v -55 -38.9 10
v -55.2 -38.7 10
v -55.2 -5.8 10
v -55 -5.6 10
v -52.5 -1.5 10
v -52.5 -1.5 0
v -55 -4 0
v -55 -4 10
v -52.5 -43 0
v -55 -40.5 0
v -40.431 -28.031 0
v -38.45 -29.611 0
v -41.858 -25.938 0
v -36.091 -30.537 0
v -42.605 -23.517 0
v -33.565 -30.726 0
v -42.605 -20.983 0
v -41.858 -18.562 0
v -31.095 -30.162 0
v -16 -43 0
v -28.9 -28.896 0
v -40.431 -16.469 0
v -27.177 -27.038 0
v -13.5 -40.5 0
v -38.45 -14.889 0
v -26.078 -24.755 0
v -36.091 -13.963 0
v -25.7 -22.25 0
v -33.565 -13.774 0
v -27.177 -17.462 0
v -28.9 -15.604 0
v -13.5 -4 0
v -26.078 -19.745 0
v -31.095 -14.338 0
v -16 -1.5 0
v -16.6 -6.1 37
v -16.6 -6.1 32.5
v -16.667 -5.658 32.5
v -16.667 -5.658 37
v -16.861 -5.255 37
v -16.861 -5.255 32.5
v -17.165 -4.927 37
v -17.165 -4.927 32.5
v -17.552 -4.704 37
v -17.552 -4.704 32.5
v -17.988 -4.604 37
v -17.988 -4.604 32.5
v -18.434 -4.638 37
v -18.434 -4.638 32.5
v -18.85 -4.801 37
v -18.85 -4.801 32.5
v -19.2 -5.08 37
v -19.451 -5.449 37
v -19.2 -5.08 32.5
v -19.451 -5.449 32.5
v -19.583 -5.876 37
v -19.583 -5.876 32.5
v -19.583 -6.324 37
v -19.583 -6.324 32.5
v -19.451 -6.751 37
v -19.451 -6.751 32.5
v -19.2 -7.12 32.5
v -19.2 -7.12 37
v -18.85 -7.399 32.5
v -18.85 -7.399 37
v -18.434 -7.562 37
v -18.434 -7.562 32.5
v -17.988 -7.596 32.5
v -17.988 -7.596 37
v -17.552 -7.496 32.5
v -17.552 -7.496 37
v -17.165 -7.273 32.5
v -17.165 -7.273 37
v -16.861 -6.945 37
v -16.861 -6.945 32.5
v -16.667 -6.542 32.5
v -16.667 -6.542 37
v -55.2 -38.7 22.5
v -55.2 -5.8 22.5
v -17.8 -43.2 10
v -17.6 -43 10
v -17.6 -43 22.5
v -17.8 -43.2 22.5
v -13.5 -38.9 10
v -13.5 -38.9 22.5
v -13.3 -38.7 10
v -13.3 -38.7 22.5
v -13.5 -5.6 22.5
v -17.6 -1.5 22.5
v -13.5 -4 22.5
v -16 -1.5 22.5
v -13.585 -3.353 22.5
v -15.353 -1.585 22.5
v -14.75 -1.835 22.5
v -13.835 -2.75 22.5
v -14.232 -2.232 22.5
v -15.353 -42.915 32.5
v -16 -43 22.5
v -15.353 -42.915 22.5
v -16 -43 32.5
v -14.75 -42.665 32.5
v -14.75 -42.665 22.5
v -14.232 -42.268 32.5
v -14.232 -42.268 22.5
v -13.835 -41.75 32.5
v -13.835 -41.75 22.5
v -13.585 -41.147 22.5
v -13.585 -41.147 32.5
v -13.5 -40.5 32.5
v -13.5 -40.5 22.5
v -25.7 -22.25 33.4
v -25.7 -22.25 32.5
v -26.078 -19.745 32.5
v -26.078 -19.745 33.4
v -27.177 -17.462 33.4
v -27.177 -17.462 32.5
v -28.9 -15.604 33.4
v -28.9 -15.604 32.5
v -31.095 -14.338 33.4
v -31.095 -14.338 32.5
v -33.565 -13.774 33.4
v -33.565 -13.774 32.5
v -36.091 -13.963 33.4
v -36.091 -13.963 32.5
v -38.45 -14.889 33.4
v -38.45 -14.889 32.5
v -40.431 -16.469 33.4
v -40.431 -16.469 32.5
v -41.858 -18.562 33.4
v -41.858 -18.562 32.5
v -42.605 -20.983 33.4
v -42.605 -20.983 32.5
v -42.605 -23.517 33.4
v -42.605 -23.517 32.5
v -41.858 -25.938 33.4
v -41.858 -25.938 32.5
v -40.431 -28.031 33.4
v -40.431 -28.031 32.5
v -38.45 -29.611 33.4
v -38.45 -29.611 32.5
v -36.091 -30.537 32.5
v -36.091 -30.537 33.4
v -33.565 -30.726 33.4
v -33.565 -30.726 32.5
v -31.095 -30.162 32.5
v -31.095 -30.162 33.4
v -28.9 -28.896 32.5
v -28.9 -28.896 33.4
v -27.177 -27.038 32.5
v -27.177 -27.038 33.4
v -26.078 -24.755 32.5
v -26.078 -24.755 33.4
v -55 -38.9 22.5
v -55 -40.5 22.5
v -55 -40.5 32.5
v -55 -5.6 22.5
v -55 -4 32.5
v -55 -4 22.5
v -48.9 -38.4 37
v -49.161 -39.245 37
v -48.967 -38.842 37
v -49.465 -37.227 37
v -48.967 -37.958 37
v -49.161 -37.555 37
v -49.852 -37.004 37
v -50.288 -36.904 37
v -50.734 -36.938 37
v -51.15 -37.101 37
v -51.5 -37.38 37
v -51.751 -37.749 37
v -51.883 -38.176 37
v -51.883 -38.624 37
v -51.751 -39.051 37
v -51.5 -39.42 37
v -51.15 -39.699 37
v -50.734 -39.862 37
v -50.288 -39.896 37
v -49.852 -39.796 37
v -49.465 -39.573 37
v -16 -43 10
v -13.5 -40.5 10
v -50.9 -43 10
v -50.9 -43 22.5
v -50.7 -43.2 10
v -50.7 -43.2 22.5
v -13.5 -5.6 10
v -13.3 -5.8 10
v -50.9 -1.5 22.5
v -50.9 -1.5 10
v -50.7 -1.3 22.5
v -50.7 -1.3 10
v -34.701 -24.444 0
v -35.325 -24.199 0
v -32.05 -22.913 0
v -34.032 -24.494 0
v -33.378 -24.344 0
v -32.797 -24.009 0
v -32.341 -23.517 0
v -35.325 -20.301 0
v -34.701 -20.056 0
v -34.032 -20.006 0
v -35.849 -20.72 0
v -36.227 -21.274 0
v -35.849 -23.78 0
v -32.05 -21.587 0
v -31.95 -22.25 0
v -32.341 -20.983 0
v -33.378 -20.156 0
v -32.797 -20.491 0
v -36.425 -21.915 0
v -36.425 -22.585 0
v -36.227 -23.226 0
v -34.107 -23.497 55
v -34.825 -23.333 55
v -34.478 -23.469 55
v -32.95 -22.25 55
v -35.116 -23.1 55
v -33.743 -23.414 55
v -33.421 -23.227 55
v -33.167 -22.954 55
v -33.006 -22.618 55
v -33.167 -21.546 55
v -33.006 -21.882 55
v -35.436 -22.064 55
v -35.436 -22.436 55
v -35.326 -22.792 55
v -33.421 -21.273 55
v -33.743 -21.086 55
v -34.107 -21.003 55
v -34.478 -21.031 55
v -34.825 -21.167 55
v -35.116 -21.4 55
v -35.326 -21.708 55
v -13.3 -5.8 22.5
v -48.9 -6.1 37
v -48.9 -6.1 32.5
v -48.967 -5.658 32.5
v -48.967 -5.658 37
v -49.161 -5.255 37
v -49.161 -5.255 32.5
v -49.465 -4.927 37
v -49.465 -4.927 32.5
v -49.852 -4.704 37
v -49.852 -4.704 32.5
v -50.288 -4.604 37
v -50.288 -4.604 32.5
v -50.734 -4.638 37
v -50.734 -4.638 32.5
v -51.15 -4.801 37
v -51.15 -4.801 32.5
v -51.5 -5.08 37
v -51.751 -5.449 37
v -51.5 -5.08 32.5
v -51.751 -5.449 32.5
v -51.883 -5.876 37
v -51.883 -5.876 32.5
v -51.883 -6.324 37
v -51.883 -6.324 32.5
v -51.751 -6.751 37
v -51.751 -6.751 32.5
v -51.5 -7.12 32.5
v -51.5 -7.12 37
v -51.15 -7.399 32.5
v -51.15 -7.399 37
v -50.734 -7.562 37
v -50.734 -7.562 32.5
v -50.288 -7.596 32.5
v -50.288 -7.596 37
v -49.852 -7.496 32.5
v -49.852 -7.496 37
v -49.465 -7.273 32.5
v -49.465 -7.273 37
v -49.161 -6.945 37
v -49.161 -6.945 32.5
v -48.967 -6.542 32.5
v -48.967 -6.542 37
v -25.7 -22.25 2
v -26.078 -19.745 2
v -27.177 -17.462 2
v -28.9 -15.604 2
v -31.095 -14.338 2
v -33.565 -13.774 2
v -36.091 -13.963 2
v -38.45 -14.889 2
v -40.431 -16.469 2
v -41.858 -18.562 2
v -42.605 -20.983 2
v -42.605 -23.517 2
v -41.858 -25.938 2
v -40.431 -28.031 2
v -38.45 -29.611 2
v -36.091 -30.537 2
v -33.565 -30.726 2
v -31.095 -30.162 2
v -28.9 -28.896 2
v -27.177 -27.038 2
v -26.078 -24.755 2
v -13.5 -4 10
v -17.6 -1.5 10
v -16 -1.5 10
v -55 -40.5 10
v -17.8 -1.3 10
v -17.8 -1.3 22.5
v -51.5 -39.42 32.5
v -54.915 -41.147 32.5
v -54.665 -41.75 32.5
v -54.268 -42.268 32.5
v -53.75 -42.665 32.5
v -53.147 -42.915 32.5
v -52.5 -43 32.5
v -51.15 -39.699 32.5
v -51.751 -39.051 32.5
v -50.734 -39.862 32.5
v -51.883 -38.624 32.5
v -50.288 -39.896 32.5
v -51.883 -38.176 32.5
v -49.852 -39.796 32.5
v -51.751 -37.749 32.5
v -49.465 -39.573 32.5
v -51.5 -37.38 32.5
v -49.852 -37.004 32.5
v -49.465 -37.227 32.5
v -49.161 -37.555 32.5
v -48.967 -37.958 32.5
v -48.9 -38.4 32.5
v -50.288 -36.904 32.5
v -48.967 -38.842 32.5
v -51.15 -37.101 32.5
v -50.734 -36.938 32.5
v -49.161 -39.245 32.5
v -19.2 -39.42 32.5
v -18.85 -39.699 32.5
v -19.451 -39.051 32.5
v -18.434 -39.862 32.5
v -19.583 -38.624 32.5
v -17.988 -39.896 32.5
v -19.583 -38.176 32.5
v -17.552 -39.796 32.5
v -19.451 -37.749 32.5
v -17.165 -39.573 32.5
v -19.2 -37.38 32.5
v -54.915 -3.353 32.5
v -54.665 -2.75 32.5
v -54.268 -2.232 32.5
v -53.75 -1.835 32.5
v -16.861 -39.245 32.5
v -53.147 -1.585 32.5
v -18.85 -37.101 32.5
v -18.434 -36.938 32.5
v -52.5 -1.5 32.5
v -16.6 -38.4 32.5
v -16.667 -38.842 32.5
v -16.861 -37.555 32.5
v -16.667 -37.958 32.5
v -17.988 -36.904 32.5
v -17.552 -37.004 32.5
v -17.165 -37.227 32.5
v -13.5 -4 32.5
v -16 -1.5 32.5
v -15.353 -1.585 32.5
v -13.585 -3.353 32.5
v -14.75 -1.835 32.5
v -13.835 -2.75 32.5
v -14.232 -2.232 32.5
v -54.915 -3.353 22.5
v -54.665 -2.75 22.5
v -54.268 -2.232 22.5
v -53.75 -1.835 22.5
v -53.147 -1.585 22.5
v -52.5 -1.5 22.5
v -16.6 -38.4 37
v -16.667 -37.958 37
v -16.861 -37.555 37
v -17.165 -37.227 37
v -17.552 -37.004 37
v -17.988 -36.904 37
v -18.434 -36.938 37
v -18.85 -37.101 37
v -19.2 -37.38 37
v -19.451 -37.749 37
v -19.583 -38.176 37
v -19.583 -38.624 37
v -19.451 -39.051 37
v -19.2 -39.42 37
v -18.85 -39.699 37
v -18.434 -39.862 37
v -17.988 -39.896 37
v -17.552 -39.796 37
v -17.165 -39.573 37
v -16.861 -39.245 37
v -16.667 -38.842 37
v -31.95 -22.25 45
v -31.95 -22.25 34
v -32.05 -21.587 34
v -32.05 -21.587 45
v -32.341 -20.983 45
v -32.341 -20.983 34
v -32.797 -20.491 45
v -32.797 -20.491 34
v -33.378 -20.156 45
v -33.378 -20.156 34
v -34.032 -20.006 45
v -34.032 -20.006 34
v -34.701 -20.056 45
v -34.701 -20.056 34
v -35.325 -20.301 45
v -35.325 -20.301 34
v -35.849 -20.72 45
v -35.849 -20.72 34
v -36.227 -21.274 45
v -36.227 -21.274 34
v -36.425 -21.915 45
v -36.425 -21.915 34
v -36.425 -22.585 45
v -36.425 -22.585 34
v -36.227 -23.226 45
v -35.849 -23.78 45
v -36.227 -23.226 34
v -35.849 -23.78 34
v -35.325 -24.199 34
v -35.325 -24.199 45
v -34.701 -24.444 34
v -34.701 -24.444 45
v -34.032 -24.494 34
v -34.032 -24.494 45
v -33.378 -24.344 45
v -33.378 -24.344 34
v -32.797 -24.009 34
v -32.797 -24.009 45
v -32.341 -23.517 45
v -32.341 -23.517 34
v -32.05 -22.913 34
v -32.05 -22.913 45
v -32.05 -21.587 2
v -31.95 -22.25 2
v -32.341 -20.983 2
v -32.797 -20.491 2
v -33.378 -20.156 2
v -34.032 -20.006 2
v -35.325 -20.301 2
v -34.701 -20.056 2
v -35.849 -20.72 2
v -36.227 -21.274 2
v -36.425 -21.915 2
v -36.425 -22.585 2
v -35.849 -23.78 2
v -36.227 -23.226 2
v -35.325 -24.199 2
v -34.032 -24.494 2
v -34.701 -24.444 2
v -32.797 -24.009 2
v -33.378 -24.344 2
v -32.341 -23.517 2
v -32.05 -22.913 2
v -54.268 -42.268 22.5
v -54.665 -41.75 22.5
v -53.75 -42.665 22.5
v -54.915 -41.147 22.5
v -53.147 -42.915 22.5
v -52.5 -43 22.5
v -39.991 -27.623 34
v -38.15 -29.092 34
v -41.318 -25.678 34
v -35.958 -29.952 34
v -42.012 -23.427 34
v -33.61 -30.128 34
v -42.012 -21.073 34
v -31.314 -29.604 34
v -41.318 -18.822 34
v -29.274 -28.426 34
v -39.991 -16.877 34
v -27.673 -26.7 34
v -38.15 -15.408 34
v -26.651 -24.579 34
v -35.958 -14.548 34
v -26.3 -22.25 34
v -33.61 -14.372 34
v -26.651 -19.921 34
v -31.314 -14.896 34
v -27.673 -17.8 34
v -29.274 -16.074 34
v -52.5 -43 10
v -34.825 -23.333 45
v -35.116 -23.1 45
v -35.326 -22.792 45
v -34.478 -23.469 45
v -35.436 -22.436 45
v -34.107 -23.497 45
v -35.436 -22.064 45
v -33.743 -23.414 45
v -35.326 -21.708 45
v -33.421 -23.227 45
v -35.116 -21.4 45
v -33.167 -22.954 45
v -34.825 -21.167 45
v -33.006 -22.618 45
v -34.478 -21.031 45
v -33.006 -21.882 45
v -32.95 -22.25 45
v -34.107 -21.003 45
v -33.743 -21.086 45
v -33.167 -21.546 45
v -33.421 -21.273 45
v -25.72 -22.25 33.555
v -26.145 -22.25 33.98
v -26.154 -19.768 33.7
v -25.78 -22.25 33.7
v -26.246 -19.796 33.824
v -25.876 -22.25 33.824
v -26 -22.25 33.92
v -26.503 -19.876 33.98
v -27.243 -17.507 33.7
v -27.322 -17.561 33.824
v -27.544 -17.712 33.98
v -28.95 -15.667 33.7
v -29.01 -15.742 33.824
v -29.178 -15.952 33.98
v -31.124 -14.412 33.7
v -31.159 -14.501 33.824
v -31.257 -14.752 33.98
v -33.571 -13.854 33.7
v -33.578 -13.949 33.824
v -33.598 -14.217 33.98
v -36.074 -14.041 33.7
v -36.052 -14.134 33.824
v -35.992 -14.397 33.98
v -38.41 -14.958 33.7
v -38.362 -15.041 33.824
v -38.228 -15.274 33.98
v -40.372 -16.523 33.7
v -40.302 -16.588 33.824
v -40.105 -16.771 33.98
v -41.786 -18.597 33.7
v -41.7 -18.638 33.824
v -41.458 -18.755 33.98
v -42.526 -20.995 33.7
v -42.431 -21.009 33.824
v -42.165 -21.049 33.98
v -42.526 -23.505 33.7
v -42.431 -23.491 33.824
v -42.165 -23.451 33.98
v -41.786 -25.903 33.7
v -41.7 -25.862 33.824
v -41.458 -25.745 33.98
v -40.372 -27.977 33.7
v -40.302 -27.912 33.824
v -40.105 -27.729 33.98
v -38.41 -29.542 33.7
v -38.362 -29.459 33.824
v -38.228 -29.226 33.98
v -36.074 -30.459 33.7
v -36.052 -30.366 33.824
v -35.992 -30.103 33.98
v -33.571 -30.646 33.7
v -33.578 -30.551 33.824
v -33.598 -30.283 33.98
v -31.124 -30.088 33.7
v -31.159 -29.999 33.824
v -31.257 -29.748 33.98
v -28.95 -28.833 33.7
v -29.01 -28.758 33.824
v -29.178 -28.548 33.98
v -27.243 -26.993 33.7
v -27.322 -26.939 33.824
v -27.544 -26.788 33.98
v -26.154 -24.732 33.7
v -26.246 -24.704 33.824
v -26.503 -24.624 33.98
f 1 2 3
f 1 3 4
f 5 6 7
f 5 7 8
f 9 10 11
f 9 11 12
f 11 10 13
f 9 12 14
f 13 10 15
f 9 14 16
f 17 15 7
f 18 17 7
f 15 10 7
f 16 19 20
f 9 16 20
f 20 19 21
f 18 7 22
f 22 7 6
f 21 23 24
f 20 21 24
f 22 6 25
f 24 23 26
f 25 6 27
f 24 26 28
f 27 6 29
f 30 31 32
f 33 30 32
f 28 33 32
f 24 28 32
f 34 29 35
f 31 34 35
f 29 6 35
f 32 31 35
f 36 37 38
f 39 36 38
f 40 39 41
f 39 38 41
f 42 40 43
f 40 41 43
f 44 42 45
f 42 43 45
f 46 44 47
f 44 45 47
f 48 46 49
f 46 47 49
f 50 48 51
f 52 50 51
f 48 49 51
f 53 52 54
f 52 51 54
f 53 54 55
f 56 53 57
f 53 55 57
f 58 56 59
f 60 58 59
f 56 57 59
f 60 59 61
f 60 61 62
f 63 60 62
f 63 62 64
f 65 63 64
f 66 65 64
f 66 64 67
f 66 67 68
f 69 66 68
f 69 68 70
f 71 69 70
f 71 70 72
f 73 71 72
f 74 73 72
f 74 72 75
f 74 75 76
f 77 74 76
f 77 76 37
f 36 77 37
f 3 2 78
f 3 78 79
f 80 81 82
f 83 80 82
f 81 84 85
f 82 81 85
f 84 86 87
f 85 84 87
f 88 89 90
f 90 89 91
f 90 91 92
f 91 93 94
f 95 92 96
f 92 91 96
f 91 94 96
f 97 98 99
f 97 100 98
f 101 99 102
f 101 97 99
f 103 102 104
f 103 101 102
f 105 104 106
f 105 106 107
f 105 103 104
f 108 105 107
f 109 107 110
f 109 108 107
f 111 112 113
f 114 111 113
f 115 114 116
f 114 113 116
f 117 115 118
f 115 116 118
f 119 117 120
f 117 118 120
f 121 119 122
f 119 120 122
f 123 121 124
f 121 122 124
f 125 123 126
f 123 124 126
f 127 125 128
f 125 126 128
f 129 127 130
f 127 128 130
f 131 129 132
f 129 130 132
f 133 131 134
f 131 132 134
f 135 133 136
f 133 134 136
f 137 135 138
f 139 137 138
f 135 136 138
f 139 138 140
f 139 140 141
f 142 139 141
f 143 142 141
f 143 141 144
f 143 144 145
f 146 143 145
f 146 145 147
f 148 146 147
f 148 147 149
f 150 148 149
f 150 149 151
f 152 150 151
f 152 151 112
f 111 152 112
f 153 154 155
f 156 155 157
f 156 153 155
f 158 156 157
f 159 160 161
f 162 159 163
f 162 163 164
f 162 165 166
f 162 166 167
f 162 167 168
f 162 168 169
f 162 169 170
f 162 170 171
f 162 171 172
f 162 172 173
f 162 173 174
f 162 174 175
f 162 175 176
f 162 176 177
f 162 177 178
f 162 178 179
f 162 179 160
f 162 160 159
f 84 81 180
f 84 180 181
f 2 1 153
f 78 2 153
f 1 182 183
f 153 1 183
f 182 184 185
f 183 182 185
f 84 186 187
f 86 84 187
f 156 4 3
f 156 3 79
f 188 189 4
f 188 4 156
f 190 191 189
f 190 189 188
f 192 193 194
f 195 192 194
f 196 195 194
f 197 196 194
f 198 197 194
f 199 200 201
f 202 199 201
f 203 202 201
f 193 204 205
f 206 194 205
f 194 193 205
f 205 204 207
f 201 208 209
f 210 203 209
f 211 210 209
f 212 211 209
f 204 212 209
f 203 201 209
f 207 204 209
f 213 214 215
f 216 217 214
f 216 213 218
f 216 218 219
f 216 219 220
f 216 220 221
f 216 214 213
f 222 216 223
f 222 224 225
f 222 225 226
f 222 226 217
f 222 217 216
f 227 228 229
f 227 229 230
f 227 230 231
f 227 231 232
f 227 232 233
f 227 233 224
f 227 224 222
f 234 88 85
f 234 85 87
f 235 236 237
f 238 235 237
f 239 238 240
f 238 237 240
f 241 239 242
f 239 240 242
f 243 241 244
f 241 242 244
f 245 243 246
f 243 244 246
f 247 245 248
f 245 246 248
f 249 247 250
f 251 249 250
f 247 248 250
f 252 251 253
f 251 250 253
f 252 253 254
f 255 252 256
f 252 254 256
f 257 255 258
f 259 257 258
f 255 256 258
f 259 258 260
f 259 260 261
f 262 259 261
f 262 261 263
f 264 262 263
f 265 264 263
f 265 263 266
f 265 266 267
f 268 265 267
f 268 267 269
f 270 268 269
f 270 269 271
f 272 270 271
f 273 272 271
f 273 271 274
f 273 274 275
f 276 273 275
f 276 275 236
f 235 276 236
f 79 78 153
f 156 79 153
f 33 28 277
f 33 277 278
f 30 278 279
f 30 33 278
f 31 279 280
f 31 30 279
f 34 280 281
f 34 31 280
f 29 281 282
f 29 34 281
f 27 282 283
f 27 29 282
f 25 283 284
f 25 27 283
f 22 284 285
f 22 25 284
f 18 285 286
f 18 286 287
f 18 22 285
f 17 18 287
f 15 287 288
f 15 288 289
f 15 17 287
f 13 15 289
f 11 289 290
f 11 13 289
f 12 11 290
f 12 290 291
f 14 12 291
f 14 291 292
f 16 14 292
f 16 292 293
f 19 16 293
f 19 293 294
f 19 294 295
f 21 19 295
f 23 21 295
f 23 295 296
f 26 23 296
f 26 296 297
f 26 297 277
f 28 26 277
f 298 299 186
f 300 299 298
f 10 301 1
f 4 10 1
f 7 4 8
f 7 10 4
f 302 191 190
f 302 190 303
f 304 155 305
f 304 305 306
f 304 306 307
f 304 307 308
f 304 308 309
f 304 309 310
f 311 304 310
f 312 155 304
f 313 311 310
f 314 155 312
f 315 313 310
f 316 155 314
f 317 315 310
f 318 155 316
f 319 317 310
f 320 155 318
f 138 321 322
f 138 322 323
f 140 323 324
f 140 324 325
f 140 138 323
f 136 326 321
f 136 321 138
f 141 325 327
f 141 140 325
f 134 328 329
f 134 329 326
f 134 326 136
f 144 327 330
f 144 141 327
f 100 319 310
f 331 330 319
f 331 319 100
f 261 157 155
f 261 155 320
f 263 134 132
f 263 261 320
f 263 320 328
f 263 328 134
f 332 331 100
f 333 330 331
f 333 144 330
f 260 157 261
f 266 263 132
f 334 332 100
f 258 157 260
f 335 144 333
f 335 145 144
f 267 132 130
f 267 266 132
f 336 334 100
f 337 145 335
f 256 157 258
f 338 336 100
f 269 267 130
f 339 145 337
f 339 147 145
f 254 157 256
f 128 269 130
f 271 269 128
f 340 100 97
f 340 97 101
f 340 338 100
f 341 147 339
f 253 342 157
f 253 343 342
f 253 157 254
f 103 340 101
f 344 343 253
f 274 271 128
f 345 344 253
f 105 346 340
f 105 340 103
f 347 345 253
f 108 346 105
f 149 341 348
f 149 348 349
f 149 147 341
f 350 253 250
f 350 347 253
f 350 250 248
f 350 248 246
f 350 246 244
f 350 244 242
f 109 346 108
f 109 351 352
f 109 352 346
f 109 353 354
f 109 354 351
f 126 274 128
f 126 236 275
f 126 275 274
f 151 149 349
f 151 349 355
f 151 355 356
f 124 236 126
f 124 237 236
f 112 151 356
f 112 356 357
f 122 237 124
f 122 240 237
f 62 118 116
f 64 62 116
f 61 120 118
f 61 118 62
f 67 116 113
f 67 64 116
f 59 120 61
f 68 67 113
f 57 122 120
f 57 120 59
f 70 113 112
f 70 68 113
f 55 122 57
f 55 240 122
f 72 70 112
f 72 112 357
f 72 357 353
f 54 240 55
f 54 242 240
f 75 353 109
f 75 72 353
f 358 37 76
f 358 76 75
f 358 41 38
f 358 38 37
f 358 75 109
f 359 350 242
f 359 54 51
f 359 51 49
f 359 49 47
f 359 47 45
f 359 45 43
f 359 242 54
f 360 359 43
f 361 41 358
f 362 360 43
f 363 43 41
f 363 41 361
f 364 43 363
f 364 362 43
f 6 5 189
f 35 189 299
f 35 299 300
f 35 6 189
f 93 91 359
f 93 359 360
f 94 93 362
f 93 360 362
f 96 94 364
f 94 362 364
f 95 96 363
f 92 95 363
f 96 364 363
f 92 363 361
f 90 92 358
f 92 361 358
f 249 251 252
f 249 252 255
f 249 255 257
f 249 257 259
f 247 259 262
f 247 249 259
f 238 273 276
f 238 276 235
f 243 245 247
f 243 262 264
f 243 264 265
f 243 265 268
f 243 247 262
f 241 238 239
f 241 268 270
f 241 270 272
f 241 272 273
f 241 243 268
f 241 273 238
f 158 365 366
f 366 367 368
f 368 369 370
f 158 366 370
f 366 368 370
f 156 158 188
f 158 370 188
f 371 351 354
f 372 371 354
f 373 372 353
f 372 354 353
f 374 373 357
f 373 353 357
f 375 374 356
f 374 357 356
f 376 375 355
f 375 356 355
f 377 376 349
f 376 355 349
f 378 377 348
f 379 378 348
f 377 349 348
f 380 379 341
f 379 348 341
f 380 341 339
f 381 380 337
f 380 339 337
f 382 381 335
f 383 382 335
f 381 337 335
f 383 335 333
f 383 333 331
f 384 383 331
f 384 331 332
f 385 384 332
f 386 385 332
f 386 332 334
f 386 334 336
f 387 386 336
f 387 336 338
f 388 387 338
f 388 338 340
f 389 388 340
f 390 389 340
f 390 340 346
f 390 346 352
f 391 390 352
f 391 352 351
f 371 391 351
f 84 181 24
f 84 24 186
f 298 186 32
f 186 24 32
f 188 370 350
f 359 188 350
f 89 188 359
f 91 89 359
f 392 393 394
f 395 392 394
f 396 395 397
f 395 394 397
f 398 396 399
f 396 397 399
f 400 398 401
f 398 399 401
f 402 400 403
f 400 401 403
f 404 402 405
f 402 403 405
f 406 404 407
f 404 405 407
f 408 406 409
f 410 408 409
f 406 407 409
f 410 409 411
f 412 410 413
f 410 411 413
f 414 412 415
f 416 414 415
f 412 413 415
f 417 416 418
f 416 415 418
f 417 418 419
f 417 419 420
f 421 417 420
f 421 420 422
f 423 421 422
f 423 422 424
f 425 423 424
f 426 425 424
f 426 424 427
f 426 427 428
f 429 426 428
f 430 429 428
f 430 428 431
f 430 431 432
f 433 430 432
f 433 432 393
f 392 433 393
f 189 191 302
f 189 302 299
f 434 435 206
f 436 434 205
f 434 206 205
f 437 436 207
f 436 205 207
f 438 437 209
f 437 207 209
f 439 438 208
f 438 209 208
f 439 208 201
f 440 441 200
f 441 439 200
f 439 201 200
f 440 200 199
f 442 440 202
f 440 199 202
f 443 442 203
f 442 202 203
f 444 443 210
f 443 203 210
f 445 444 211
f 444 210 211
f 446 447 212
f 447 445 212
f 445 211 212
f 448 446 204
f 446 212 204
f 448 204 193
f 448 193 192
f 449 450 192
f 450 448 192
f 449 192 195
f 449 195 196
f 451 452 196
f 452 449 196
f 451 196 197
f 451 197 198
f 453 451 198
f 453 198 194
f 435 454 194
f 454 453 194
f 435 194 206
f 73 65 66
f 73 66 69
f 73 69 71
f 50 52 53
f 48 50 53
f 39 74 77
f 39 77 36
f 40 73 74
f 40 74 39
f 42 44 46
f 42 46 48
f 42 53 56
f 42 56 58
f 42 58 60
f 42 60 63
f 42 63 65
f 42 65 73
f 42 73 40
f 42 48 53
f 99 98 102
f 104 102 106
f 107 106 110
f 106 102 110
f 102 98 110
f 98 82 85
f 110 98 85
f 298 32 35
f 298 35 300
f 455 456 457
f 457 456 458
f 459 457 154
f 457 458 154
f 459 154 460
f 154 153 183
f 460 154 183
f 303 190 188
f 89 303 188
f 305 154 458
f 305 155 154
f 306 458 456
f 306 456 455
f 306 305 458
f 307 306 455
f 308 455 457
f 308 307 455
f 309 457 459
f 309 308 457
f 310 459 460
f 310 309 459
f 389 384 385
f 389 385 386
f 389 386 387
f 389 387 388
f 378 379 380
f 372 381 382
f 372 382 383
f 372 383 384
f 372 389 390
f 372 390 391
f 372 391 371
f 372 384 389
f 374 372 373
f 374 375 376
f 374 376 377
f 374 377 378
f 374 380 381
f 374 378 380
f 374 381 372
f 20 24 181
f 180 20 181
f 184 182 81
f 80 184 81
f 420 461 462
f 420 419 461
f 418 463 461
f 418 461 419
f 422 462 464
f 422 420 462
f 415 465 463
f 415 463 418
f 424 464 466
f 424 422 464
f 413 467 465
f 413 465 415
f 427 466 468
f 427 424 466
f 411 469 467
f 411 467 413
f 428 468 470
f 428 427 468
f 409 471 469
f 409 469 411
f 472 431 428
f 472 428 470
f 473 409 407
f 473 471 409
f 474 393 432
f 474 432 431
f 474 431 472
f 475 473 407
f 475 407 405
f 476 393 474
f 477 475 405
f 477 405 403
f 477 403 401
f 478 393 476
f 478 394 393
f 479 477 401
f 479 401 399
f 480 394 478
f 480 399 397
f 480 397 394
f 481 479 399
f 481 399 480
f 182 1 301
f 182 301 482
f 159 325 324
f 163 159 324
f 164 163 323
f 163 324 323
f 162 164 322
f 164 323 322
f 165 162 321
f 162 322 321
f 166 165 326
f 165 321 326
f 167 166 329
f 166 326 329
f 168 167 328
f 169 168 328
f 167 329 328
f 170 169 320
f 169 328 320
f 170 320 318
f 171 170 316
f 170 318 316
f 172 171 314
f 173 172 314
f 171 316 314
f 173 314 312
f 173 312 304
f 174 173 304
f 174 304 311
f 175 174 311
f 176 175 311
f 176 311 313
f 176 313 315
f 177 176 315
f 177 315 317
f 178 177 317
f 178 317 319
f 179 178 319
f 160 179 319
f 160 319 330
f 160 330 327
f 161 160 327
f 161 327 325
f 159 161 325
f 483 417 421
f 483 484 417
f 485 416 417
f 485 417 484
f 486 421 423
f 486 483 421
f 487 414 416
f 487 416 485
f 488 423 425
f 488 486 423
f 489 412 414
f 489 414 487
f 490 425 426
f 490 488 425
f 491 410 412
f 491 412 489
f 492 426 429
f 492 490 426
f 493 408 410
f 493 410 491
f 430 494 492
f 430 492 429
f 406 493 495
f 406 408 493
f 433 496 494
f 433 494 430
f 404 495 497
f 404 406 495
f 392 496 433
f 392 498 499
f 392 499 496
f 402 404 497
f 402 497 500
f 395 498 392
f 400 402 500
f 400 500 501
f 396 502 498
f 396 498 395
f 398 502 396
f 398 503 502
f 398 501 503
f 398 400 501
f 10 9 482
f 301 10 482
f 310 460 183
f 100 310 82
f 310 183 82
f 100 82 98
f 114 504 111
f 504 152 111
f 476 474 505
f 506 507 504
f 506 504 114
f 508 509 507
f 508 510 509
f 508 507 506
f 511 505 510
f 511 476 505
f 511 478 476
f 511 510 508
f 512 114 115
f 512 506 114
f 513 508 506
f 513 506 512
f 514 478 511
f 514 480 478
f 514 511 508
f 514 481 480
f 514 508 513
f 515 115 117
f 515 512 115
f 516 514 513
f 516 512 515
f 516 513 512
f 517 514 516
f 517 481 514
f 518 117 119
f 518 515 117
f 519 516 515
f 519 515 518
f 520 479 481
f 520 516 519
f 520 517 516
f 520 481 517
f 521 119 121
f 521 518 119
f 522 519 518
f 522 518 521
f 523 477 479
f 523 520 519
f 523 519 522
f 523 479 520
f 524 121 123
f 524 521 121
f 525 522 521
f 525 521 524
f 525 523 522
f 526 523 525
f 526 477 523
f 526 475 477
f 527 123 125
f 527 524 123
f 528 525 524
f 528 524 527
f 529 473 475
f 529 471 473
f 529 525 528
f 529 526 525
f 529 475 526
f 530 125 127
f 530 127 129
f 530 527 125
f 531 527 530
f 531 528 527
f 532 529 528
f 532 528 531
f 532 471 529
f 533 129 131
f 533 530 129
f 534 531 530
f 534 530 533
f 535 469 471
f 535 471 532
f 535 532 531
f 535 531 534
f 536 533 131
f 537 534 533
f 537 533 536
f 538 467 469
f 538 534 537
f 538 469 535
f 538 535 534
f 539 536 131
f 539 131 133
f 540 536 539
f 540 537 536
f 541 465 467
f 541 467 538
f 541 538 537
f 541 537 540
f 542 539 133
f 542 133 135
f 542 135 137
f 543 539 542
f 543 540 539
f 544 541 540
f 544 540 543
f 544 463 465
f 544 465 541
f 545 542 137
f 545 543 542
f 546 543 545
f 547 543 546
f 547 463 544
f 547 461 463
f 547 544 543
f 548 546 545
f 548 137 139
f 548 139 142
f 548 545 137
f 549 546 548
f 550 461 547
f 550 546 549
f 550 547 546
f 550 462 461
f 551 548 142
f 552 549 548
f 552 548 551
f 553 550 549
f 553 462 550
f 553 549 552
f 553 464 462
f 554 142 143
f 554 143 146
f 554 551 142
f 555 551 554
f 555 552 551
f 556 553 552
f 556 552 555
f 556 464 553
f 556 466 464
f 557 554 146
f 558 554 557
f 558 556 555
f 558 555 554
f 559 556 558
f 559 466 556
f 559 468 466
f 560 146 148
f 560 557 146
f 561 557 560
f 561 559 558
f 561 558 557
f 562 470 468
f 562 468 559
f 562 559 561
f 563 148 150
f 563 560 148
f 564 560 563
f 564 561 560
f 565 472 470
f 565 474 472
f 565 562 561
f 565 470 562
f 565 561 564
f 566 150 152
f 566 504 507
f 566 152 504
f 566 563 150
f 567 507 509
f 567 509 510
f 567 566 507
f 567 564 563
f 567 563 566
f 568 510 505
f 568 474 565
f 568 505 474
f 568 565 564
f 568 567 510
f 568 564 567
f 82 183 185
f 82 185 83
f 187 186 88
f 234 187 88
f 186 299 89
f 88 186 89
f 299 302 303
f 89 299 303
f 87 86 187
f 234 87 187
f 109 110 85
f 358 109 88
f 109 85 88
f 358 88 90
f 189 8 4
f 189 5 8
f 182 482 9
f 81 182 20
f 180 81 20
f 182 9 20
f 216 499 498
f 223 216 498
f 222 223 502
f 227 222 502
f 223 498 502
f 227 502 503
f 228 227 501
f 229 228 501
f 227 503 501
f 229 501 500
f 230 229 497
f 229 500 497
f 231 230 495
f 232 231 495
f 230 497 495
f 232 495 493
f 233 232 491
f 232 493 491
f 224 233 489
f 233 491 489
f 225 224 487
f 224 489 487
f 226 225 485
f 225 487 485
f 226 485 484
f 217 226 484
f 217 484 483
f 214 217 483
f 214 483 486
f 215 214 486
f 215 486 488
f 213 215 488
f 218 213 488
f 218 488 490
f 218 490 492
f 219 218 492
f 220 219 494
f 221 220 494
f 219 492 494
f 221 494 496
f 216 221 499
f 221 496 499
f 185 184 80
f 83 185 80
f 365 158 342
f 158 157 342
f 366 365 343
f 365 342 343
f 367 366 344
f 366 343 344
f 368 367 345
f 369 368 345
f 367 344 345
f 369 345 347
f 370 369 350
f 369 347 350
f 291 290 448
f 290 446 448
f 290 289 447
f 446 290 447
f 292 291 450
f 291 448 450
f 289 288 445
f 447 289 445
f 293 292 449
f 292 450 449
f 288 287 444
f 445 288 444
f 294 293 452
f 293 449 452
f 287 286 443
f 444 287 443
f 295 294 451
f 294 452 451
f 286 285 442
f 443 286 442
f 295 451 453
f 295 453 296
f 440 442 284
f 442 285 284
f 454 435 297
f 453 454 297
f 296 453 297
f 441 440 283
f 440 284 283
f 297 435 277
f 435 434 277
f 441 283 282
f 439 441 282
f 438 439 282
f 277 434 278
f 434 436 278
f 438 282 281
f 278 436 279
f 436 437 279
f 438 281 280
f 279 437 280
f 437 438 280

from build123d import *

# Parameters (mm, degrees)
CYLINDER007_R     = 1.5
CYLINDER007_DEPTH = 10
CYLINDER006_R     = 1.5
CYLINDER006_DEPTH = 10
CYLINDER005_R     = 1.5
CYLINDER005_DEPTH = 10
CYLINDER004_R     = 1.5
CYLINDER004_DEPTH = 10
CYLINDER001_R     = 8.5
CYLINDER001_DEPTH = 32
FILLET001_R       = 0.6
CYLINDER002_R     = 8.5
CYLINDER002_DEPTH = 3
BOX001_W          = 44.5
BOX001_H          = 44.5
BOX001_DEPTH      = 12.5
BOX_W             = 41.5
BOX_H             = 41.5
BOX_DEPTH         = 32.5
FILLET_R          = 2.5
CHAMFER_SIZE      = 2.5
BOX002_W          = 41.9
BOX002_H          = 41.9
BOX002_DEPTH      = 12.5
CHAMFER001_SIZE   = 4.5
CYLINDER003_R     = 1.25
CYLINDER003_DEPTH = 10
CYLINDER_R        = 2.25
CYLINDER_DEPTH    = 45


with BuildPart() as tornillo020:
    # Cylinder007 → Cylinder007 (new body)
    with BuildSketch(Plane(origin=(-50.4, -6.1, 27), x_dir=(1, 0, 0), z_dir=(0, 0, 1))):
        Circle(CYLINDER007_R)
    extrude(amount=CYLINDER007_DEPTH)


with BuildPart() as tornillo019:
    # Cylinder006 → Cylinder006 (new body)
    with BuildSketch(Plane(origin=(-18.1, -6.1, 27), x_dir=(1, 0, 0), z_dir=(0, 0, 1))):
        Circle(CYLINDER006_R)
    extrude(amount=CYLINDER006_DEPTH)


with BuildPart() as tornillo018:
    # Cylinder005 → Cylinder005 (new body)
    with BuildSketch(Plane(origin=(-50.4, -38.4, 27), x_dir=(1, 0, 0), z_dir=(0, 0, 1))):
        Circle(CYLINDER005_R)
    extrude(amount=CYLINDER005_DEPTH)


with BuildPart() as tornillo017:
    # Cylinder004 → Cylinder004 (new body)
    with BuildSketch(Plane(origin=(-18.1, -38.4, 27), x_dir=(1, 0, 0), z_dir=(0, 0, 1))):
        Circle(CYLINDER004_R)
    extrude(amount=CYLINDER004_DEPTH)


with BuildPart() as fillet001:
    # Cylinder001 → Cylinder001 (new body)
    with BuildSketch(Plane(origin=(-34.2, -22.25, 2), x_dir=(1, 0, 0), z_dir=(0, 0, 1))):
        Circle(CYLINDER001_R)
    extrude(amount=CYLINDER001_DEPTH)

    # Fillet001
    fillet001_edges = [fillet001.edges().sort_by_distance(p)[0] for p in [
        (-42.7, -22.25, 34),
    ]]
    fillet(fillet001_edges, radius=FILLET001_R)


with BuildPart() as cilindro036:
    # Cylinder002 → Cylinder002 (new body)
    with BuildSketch(Plane(origin=(-34.2, -22.25, -1), x_dir=(1, 0, 0), z_dir=(0, 0, 1))):
        Circle(CYLINDER002_R)
    extrude(amount=CYLINDER002_DEPTH)


with BuildPart() as cubo087:
    # Box001 → Box001 (new body)
    with BuildSketch(Plane(origin=(-56, -44, 10), x_dir=(1, 0, 0), z_dir=(0, 0, 1))):
        with Locations((22.25, 22.25)):
            Rectangle(BOX001_W, BOX001_H)
    extrude(amount=BOX001_DEPTH)


with BuildPart() as chamfer_body:
    # Box → Box (new body)
    with BuildSketch(Plane(origin=(-55, -43, 0), x_dir=(1, 0, 0), z_dir=(0, 0, 1))):
        with Locations((20.75, 20.75)):
            Rectangle(BOX_W, BOX_H)
    extrude(amount=BOX_DEPTH)

    # Cut: cut Cubo087
    add(cubo087.part, mode=Mode.SUBTRACT)

    # Fillet
    fillet_edges = [chamfer_body.edges().sort_by_distance(p)[0] for p in [
        (-55, -43, 27.5),
        (-55, -1.5, 27.5),
        (-13.5, -1.5, 27.5),
        (-13.5, -43, 27.5),
    ]]
    fillet(fillet_edges, radius=FILLET_R)

    # Chamfer
    chamfer_edges = [chamfer_body.edges().sort_by_distance(p)[0] for p in [
        (-55, -1.5, 5),
        (-55, -43, 5),
        (-13.5, -1.5, 5),
        (-13.5, -43, 5),
    ]]
    chamfer(chamfer_edges, length=CHAMFER_SIZE)


with BuildPart() as cut001:
    # Box002 → Box002 (new body)
    with BuildSketch(Plane(origin=(-55.2, -43.2, 10), x_dir=(1, 0, 0), z_dir=(0, 0, 1))):
        with Locations((20.95, 20.95)):
            Rectangle(BOX002_W, BOX002_H)
    extrude(amount=BOX002_DEPTH)

    # Chamfer001
    chamfer001_edges = [cut001.edges().sort_by_distance(p)[0] for p in [
        (-55.2, -43.2, 16.25),
        (-55.2, -1.3, 16.25),
        (-13.3, -43.2, 16.25),
        (-13.3, -1.3, 16.25),
    ]]
    chamfer(chamfer001_edges, length=CHAMFER001_SIZE)

    # Fusion: union Chamfer body
    add(chamfer_body.part)

    # Cut001: cut Cilindro036
    add(cilindro036.part, mode=Mode.SUBTRACT)


with BuildPart() as cilindro037:
    # Cylinder003 → Cylinder003 (new body)
    with BuildSketch(Plane(origin=(-34.2, -22.25, 45), x_dir=(1, 0, 0), z_dir=(0, 0, 1))):
        Circle(CYLINDER003_R)
    extrude(amount=CYLINDER003_DEPTH)


with BuildPart() as ejey_motor:
    # Cylinder → Cylinder (new body)
    with BuildSketch(Plane(origin=(-34.2, -22.25, 0), x_dir=(1, 0, 0), z_dir=(0, 0, 1))):
        Circle(CYLINDER_R)
    extrude(amount=CYLINDER_DEPTH)

    # Fusion002: union Fillet001, Cut001, Cilindro037
    add(fillet001.part)
    add(cut001.part)
    add(cilindro037.part)

    # Fusion001: union tornillo020, tornillo019, tornillo018, tornillo017
    add(tornillo020.part)
    add(tornillo019.part)
    add(tornillo018.part)
    add(tornillo017.part)


solid = ejey_motor.part
